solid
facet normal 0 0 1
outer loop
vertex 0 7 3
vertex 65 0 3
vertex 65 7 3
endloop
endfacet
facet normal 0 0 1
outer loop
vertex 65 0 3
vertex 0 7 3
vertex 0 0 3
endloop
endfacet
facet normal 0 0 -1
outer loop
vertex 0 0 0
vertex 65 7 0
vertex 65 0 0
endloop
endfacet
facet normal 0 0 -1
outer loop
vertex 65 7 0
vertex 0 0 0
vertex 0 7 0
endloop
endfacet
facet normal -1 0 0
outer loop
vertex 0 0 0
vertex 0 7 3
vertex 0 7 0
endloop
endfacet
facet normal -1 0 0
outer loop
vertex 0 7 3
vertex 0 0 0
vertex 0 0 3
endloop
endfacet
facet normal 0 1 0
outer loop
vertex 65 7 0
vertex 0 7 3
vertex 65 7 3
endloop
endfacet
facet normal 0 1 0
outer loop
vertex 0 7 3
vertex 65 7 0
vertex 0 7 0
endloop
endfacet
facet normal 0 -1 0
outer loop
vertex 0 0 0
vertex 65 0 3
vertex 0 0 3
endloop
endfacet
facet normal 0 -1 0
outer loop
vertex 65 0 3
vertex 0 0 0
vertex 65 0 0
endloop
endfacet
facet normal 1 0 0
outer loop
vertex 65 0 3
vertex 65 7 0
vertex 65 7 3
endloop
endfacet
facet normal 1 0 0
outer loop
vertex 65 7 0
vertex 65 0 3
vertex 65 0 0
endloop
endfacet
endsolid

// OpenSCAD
translate([2.5, 3.5, 1.5]) color([0.14750072005511716, 0.31607169754224296, 0.2088660889148145]) cube([5, 7, 3], center=true);
translate([7.5, 3.5, 1.5]) color([0.1868244368145192, 0.3491672112743387, 0.9834841816788549]) cube([5, 7, 3], center=true);
translate([12.5, 3.5, 1.5]) color([0.427290207198605, 0.49195852420878716, 0.7297831417632067]) cube([5, 7, 3], center=true);
translate([17.5, 3.5, 1.5]) color([0.7955834433152874, 0.43927203819181504, 0.2042687131951023]) cube([5, 7, 3], center=true);
translate([22.5, 3.5, 1.5]) color([0.709997013582239, 0.9058221085991531, 0.03327924187503195]) cube([5, 7, 3], center=true);
translate([27.5, 3.5, 1.5]) color([0.6331757983912308, 0.8710093735661795, 0.3636101637556439]) cube([5, 7, 3], center=true);
translate([32.5, 3.5, 1.5]) color([0.7431628081058981, 0.6774926049513658, 0.23306417175218364]) cube([5, 7, 3], center=true);
translate([37.5, 3.5, 1.5]) color([0.2975271762349214, 0.0866296567389645, 0.8688435220131177]) cube([5, 7, 3], center=true);
translate([42.5, 3.5, 1.5]) color([0.7514921149941085, 0.7714305883456576, 0.8829516943772963]) cube([5, 7, 3], center=true);
translate([47.5, 3.5, 1.5]) color([0.4114323292545551, 0.05394001775890156, 0.696805048854085]) cube([5, 7, 3], center=true);
translate([52.5, 3.5, 1.5]) color([0.6656296547984208, 0.6485122289860075, 0.5471816206705559]) cube([5, 7, 3], center=true);
translate([56.0, 2.5, 1.5]) color([0.7344166333532061, 0.4306045068871984, 0.45460236437769275]) cube([2, 5, 3], center=true);
translate([58.0, 2.5, 1.5]) color([0.25475221651879554, 0.47565246533915095, 0.3371942584654095]) cube([2, 5, 3], center=true);
translate([60.0, 2.5, 1.5]) color([0.04223511400675217, 0.05255331220371673, 0.34980223330761895]) cube([2, 5, 3], center=true);
translate([62.0, 2.5, 1.5]) color([0.2898096938030986, 0.007130057665757694, 0.06369015415518986]) cube([2, 5, 3], center=true);
translate([64.0, 2.5, 1.5]) color([0.42774457246440645, 0.22216650821772055, 0.6086379170158094]) cube([2, 5, 3], center=true);
translate([57.5, 6.0, 1.5]) color([0.557768500755667, 0.22097295115667703, 0.19284823789822858]) cube([5, 2, 3], center=true);
translate([62.5, 6.0, 1.5]) color([0.6083188139076446, 0.606354511401297, 0.08562053587131313]) cube([5, 2, 3], center=true);
